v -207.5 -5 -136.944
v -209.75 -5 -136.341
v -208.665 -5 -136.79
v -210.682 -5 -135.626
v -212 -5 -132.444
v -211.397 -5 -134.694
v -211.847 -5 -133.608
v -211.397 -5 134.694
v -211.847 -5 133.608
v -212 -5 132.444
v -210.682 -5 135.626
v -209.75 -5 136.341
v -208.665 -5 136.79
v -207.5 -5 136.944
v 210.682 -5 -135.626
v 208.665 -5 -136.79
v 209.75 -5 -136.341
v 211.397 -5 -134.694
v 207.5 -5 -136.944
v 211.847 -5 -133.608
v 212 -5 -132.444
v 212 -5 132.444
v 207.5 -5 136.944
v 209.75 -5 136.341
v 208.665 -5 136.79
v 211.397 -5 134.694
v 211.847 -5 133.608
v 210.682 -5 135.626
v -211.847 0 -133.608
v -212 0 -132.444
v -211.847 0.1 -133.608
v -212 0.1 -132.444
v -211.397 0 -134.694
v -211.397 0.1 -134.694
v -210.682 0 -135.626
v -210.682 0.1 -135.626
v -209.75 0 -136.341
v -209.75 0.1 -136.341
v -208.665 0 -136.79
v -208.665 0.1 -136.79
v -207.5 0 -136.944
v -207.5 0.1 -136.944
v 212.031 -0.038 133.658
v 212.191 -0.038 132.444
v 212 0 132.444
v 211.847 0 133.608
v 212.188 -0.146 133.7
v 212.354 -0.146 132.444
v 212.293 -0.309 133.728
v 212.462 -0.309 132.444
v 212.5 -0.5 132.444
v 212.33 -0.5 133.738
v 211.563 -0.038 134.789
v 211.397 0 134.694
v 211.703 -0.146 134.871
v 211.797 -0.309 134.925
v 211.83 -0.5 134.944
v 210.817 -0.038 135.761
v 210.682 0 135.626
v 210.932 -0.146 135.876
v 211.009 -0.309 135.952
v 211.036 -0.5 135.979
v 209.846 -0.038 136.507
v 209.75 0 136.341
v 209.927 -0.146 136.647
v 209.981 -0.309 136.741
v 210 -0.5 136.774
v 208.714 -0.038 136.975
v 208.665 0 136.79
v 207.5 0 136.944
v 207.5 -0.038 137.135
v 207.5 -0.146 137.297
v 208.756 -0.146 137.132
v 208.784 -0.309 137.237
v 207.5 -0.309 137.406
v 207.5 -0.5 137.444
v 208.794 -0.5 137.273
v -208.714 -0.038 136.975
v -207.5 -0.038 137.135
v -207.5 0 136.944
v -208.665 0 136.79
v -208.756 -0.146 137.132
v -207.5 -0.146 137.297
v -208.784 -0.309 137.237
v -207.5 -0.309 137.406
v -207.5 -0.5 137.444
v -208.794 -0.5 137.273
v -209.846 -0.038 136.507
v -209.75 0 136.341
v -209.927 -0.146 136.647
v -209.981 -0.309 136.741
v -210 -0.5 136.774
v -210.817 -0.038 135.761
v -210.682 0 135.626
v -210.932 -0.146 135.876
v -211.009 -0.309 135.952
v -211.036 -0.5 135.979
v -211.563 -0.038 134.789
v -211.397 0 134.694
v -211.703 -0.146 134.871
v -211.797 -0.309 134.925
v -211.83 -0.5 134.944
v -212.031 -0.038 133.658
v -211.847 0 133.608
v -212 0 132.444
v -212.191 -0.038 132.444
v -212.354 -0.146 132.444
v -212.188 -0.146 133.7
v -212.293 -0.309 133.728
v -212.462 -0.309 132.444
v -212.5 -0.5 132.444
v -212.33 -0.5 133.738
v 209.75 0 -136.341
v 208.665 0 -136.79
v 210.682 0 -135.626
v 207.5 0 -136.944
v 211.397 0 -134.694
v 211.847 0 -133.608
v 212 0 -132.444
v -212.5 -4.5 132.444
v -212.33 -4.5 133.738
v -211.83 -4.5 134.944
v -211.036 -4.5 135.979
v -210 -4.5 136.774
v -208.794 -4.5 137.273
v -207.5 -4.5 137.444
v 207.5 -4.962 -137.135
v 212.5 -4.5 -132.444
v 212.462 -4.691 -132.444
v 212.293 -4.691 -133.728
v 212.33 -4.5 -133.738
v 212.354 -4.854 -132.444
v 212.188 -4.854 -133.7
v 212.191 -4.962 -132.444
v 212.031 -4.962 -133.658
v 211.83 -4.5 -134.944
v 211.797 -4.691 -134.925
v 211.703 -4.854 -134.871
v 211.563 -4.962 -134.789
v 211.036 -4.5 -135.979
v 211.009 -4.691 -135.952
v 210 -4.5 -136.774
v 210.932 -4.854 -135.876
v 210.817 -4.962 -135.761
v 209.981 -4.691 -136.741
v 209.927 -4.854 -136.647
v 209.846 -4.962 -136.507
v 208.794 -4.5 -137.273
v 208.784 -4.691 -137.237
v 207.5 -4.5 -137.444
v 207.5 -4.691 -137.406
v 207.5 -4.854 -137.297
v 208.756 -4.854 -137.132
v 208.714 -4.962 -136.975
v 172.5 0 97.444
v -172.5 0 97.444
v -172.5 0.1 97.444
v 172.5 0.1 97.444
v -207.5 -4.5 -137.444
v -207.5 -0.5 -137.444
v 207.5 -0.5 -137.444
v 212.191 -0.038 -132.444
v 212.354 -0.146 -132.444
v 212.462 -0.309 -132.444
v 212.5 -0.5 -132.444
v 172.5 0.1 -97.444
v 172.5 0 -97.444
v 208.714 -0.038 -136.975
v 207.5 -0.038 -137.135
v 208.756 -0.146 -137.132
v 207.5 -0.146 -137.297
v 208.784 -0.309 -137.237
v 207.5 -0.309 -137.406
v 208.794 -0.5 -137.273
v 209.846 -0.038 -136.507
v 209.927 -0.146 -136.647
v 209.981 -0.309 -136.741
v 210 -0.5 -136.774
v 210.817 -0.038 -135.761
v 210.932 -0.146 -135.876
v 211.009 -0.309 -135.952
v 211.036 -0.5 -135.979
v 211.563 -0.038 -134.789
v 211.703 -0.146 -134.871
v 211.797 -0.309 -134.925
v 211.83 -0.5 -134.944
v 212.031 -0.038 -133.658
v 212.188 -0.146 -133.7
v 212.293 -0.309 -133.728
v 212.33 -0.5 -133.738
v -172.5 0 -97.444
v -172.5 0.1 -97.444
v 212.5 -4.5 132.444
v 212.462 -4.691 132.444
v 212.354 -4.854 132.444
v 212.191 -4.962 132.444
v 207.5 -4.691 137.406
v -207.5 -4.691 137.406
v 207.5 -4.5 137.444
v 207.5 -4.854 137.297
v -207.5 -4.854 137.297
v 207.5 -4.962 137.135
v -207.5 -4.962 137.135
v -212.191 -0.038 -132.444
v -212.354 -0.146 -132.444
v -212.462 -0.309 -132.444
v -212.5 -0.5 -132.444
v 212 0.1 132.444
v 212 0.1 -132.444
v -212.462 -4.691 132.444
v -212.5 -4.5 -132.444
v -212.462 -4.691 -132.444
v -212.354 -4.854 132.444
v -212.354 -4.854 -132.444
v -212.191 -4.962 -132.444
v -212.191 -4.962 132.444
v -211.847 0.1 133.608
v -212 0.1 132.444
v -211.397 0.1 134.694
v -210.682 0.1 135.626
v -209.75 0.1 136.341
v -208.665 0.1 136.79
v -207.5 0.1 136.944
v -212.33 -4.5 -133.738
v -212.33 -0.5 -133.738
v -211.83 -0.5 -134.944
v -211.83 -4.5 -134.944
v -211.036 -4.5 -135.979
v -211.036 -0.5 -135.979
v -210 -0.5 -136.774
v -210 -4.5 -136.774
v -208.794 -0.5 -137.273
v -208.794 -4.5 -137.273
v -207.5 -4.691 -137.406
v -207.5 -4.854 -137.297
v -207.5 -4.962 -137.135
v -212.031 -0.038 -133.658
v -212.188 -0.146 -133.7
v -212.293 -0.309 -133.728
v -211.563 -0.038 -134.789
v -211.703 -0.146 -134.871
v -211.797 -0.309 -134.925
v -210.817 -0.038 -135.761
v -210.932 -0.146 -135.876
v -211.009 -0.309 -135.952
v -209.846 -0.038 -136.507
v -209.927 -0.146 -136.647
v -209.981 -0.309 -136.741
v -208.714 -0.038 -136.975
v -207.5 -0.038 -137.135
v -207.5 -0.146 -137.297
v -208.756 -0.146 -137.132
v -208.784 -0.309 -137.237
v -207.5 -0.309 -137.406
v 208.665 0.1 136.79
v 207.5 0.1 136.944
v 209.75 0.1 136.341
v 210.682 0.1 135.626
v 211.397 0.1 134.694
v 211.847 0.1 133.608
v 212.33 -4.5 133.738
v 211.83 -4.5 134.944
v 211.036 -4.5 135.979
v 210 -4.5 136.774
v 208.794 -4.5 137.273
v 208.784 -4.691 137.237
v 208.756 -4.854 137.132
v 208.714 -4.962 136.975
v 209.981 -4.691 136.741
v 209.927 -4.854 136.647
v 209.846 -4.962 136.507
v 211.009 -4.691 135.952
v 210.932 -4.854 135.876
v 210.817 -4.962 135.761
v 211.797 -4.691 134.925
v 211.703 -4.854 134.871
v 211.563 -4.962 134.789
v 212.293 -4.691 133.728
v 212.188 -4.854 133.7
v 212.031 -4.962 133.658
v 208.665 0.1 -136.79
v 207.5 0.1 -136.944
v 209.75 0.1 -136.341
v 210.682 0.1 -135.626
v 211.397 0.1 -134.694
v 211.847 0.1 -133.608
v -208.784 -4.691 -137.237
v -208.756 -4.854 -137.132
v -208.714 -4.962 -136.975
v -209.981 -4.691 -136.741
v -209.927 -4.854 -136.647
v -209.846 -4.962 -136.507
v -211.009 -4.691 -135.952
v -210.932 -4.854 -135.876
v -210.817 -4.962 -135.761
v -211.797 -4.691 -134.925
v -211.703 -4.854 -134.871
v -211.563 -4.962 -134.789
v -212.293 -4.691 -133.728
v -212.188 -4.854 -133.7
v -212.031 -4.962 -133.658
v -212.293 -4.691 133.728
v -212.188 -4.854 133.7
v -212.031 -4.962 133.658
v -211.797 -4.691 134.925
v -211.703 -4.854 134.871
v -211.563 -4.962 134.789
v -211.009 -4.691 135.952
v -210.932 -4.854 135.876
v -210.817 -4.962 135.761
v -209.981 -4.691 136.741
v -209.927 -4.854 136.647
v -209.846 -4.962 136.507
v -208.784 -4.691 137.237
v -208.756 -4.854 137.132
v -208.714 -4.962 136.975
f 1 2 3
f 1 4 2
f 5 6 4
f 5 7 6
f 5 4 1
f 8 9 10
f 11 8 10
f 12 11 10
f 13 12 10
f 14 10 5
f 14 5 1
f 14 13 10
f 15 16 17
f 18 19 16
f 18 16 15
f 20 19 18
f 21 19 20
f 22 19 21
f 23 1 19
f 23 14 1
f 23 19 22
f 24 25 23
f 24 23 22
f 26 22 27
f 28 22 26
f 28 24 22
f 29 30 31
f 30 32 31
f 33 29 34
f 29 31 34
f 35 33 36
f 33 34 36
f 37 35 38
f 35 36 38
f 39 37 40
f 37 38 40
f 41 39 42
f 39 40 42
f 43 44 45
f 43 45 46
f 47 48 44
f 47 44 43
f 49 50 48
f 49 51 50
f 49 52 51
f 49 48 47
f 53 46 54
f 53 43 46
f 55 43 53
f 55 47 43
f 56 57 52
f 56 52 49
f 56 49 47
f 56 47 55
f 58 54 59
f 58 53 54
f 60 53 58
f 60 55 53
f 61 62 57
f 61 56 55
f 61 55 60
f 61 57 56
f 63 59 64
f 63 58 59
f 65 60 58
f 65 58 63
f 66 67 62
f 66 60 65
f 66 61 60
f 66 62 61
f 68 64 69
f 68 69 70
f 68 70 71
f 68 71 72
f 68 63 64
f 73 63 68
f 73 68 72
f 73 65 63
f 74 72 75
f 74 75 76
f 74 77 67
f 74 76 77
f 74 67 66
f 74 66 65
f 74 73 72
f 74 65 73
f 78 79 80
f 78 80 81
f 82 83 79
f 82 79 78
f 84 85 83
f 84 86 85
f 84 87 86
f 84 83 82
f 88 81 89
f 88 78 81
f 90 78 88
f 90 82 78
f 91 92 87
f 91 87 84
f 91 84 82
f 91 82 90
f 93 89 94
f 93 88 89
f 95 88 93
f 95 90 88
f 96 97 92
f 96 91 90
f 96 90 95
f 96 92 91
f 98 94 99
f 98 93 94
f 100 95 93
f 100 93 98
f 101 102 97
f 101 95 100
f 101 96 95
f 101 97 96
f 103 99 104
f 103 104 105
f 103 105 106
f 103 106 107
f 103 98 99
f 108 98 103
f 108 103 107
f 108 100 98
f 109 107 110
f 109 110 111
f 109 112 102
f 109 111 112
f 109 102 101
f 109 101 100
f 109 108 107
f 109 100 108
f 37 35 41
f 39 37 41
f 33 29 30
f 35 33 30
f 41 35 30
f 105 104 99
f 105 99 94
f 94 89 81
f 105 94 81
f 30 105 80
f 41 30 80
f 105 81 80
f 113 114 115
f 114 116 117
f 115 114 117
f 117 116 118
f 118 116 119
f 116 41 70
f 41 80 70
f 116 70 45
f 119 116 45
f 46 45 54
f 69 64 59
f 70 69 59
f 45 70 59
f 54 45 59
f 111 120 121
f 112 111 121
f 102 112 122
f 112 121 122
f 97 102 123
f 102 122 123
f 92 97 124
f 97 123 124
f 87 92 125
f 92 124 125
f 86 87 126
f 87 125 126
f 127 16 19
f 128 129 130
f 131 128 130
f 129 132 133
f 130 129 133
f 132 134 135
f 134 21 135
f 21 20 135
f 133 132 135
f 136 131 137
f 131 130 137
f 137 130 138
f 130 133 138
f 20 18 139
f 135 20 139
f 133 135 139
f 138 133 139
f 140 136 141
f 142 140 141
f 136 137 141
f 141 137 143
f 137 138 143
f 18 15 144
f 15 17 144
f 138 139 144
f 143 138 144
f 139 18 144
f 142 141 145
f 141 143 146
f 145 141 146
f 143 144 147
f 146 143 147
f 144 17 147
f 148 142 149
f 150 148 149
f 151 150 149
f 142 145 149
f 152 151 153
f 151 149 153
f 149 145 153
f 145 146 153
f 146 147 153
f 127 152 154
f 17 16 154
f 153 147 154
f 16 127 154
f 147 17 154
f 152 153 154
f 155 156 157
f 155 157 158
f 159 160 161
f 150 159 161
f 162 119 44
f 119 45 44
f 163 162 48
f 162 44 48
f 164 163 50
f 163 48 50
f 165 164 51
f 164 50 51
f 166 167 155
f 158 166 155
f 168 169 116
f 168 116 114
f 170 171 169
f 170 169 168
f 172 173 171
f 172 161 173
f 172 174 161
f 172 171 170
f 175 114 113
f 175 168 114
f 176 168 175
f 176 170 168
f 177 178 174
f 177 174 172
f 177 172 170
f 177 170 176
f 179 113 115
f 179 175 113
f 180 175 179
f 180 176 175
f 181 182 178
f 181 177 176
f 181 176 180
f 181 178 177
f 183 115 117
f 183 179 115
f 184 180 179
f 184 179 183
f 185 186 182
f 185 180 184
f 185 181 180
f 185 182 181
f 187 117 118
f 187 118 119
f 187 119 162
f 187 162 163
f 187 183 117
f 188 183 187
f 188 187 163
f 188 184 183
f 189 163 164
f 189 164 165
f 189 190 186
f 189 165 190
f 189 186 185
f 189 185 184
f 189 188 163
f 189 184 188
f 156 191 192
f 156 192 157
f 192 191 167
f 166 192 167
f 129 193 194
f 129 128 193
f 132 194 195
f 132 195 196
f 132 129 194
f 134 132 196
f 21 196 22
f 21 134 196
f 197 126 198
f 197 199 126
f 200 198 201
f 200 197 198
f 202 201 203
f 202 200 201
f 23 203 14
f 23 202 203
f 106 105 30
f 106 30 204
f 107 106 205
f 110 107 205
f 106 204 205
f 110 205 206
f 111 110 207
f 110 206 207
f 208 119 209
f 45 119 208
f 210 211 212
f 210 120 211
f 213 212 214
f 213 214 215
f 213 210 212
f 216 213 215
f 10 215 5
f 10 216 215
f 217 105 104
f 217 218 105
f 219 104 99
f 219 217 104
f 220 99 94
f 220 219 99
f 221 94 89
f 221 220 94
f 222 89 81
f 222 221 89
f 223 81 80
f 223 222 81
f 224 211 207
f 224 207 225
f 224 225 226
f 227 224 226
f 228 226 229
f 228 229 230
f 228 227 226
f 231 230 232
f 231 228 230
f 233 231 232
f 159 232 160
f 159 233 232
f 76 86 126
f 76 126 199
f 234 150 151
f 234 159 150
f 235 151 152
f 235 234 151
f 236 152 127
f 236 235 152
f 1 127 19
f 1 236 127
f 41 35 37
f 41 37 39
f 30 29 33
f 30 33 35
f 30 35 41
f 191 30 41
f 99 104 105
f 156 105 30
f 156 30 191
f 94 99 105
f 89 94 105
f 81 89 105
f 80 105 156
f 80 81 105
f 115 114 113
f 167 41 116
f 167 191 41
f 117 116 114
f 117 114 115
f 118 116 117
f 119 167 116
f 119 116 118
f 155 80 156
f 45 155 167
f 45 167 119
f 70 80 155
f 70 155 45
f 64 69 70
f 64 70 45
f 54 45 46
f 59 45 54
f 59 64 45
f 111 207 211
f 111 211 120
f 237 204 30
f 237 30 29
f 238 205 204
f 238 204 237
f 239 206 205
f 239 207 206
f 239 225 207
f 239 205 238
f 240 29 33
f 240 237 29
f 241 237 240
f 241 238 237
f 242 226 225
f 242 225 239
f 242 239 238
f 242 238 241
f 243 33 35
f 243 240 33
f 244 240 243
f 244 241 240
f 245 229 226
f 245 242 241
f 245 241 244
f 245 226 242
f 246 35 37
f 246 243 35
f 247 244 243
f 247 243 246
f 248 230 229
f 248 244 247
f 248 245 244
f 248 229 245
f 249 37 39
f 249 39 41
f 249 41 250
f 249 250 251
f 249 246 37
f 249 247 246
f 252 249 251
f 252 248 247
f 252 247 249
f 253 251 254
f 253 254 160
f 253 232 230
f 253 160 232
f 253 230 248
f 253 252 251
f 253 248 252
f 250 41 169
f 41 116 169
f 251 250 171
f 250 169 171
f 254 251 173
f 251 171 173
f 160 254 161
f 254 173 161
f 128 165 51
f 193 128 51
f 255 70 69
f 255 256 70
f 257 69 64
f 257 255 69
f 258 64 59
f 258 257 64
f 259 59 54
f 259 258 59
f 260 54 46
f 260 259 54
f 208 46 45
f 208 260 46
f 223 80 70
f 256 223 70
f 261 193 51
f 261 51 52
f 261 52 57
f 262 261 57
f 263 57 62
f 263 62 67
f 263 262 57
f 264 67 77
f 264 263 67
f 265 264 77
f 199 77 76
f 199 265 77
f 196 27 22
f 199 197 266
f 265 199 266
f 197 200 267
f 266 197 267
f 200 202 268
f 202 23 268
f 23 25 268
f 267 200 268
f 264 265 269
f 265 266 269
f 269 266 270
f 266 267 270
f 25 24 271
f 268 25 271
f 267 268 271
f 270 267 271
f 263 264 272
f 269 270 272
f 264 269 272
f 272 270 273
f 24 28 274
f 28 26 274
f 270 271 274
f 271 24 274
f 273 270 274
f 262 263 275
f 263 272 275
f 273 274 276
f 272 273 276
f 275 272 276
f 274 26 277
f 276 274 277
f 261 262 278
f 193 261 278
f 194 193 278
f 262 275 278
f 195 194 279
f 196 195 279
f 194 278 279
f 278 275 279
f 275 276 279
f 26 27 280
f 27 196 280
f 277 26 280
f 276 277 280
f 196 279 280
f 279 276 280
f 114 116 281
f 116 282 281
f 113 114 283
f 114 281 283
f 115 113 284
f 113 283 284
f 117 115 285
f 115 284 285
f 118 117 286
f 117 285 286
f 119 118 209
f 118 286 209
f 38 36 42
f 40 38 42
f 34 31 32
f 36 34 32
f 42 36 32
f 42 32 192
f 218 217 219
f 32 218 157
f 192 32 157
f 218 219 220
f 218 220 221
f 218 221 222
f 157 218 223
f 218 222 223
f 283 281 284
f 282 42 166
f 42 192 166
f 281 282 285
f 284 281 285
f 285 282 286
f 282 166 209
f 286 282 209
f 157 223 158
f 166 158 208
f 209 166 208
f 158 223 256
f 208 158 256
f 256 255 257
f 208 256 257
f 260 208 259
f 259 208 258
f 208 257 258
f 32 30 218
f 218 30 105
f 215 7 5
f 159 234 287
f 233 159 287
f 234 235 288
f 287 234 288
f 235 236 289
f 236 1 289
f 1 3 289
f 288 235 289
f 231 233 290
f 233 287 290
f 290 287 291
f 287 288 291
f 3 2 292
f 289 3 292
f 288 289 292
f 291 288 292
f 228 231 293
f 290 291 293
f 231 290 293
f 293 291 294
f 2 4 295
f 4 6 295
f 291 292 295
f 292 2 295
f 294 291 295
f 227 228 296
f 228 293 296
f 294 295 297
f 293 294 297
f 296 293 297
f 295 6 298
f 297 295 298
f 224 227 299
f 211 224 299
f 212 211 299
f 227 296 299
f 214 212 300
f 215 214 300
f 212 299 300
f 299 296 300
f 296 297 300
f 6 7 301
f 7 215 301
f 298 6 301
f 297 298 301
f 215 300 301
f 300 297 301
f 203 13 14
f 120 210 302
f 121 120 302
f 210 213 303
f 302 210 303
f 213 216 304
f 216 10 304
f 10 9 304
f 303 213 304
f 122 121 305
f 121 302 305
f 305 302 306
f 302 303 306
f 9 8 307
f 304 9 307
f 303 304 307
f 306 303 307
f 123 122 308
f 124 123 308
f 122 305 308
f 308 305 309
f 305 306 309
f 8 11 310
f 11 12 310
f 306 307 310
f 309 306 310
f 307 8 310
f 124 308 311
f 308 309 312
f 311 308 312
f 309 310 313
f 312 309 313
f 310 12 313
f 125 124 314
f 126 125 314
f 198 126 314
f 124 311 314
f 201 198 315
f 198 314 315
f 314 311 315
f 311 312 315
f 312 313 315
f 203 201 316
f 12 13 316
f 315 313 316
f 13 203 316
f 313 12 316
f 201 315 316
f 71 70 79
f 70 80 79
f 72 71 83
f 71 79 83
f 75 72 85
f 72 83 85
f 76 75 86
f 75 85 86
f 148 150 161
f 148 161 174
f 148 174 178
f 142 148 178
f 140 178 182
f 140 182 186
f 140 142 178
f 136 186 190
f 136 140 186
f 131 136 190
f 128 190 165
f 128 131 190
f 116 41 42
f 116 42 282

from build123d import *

# Parameters (mm, degrees)
F0_W     = 425
F0_H     = 274.8874998557
F0_W_2   = 345
F0_H_2   = 194.8874998557
F1_DEPTH = 5
F2_R     = 5
F3_R     = 0.5
F4_W     = 424
F4_H     = 273.8874998557
F4_W_2   = 345
F4_H_2   = 194.8874998557
F5_DEPTH = 0.1
F6_R     = 4.5


with BuildPart() as f1:
    # F0 (on Front) → F1 (new body)
    with BuildSketch(Plane.XZ):
        Rectangle(F0_W, F0_H)
        Rectangle(F0_W_2, F0_H_2, mode=Mode.SUBTRACT)
        Rectangle(F0_W_2, F0_H_2)
    extrude(amount=F1_DEPTH)

    # F2
    f2_edges = [f1.edges().sort_by_distance(p)[0] for p in [
        (-212.5, -2.5, 137.44375),
        (212.5, -2.5, 137.44375),
        (-212.5, -2.5, -137.44375),
        (212.5, -2.5, -137.44375),
    ]]
    fillet(f2_edges, radius=F2_R)

    # F3
    f3_edges = [f1.edges().sort_by_distance(p)[0] for p in [
        (-212.5, -5, 0),
        (-211.035534, 0, -135.979284),
    ]]
    fillet(f3_edges, radius=F3_R)


with BuildPart() as f5:
    # F4 (on face) → F5 (new body)
    with BuildSketch(Plane.XZ):
        Rectangle(F4_W, F4_H)
        Rectangle(F4_W_2, F4_H_2, mode=Mode.SUBTRACT)
    extrude(amount=-F5_DEPTH)

    # F6
    f6_edges = [f5.edges().sort_by_distance(p)[0] for p in [
        (-212, 0.05, -136.94375),
        (212, 0.05, -136.94375),
        (212, 0.05, 136.94375),
        (-212, 0.05, 136.94375),
    ]]
    fillet(f6_edges, radius=F6_R)


solid = Compound([f1.part, f5.part])
